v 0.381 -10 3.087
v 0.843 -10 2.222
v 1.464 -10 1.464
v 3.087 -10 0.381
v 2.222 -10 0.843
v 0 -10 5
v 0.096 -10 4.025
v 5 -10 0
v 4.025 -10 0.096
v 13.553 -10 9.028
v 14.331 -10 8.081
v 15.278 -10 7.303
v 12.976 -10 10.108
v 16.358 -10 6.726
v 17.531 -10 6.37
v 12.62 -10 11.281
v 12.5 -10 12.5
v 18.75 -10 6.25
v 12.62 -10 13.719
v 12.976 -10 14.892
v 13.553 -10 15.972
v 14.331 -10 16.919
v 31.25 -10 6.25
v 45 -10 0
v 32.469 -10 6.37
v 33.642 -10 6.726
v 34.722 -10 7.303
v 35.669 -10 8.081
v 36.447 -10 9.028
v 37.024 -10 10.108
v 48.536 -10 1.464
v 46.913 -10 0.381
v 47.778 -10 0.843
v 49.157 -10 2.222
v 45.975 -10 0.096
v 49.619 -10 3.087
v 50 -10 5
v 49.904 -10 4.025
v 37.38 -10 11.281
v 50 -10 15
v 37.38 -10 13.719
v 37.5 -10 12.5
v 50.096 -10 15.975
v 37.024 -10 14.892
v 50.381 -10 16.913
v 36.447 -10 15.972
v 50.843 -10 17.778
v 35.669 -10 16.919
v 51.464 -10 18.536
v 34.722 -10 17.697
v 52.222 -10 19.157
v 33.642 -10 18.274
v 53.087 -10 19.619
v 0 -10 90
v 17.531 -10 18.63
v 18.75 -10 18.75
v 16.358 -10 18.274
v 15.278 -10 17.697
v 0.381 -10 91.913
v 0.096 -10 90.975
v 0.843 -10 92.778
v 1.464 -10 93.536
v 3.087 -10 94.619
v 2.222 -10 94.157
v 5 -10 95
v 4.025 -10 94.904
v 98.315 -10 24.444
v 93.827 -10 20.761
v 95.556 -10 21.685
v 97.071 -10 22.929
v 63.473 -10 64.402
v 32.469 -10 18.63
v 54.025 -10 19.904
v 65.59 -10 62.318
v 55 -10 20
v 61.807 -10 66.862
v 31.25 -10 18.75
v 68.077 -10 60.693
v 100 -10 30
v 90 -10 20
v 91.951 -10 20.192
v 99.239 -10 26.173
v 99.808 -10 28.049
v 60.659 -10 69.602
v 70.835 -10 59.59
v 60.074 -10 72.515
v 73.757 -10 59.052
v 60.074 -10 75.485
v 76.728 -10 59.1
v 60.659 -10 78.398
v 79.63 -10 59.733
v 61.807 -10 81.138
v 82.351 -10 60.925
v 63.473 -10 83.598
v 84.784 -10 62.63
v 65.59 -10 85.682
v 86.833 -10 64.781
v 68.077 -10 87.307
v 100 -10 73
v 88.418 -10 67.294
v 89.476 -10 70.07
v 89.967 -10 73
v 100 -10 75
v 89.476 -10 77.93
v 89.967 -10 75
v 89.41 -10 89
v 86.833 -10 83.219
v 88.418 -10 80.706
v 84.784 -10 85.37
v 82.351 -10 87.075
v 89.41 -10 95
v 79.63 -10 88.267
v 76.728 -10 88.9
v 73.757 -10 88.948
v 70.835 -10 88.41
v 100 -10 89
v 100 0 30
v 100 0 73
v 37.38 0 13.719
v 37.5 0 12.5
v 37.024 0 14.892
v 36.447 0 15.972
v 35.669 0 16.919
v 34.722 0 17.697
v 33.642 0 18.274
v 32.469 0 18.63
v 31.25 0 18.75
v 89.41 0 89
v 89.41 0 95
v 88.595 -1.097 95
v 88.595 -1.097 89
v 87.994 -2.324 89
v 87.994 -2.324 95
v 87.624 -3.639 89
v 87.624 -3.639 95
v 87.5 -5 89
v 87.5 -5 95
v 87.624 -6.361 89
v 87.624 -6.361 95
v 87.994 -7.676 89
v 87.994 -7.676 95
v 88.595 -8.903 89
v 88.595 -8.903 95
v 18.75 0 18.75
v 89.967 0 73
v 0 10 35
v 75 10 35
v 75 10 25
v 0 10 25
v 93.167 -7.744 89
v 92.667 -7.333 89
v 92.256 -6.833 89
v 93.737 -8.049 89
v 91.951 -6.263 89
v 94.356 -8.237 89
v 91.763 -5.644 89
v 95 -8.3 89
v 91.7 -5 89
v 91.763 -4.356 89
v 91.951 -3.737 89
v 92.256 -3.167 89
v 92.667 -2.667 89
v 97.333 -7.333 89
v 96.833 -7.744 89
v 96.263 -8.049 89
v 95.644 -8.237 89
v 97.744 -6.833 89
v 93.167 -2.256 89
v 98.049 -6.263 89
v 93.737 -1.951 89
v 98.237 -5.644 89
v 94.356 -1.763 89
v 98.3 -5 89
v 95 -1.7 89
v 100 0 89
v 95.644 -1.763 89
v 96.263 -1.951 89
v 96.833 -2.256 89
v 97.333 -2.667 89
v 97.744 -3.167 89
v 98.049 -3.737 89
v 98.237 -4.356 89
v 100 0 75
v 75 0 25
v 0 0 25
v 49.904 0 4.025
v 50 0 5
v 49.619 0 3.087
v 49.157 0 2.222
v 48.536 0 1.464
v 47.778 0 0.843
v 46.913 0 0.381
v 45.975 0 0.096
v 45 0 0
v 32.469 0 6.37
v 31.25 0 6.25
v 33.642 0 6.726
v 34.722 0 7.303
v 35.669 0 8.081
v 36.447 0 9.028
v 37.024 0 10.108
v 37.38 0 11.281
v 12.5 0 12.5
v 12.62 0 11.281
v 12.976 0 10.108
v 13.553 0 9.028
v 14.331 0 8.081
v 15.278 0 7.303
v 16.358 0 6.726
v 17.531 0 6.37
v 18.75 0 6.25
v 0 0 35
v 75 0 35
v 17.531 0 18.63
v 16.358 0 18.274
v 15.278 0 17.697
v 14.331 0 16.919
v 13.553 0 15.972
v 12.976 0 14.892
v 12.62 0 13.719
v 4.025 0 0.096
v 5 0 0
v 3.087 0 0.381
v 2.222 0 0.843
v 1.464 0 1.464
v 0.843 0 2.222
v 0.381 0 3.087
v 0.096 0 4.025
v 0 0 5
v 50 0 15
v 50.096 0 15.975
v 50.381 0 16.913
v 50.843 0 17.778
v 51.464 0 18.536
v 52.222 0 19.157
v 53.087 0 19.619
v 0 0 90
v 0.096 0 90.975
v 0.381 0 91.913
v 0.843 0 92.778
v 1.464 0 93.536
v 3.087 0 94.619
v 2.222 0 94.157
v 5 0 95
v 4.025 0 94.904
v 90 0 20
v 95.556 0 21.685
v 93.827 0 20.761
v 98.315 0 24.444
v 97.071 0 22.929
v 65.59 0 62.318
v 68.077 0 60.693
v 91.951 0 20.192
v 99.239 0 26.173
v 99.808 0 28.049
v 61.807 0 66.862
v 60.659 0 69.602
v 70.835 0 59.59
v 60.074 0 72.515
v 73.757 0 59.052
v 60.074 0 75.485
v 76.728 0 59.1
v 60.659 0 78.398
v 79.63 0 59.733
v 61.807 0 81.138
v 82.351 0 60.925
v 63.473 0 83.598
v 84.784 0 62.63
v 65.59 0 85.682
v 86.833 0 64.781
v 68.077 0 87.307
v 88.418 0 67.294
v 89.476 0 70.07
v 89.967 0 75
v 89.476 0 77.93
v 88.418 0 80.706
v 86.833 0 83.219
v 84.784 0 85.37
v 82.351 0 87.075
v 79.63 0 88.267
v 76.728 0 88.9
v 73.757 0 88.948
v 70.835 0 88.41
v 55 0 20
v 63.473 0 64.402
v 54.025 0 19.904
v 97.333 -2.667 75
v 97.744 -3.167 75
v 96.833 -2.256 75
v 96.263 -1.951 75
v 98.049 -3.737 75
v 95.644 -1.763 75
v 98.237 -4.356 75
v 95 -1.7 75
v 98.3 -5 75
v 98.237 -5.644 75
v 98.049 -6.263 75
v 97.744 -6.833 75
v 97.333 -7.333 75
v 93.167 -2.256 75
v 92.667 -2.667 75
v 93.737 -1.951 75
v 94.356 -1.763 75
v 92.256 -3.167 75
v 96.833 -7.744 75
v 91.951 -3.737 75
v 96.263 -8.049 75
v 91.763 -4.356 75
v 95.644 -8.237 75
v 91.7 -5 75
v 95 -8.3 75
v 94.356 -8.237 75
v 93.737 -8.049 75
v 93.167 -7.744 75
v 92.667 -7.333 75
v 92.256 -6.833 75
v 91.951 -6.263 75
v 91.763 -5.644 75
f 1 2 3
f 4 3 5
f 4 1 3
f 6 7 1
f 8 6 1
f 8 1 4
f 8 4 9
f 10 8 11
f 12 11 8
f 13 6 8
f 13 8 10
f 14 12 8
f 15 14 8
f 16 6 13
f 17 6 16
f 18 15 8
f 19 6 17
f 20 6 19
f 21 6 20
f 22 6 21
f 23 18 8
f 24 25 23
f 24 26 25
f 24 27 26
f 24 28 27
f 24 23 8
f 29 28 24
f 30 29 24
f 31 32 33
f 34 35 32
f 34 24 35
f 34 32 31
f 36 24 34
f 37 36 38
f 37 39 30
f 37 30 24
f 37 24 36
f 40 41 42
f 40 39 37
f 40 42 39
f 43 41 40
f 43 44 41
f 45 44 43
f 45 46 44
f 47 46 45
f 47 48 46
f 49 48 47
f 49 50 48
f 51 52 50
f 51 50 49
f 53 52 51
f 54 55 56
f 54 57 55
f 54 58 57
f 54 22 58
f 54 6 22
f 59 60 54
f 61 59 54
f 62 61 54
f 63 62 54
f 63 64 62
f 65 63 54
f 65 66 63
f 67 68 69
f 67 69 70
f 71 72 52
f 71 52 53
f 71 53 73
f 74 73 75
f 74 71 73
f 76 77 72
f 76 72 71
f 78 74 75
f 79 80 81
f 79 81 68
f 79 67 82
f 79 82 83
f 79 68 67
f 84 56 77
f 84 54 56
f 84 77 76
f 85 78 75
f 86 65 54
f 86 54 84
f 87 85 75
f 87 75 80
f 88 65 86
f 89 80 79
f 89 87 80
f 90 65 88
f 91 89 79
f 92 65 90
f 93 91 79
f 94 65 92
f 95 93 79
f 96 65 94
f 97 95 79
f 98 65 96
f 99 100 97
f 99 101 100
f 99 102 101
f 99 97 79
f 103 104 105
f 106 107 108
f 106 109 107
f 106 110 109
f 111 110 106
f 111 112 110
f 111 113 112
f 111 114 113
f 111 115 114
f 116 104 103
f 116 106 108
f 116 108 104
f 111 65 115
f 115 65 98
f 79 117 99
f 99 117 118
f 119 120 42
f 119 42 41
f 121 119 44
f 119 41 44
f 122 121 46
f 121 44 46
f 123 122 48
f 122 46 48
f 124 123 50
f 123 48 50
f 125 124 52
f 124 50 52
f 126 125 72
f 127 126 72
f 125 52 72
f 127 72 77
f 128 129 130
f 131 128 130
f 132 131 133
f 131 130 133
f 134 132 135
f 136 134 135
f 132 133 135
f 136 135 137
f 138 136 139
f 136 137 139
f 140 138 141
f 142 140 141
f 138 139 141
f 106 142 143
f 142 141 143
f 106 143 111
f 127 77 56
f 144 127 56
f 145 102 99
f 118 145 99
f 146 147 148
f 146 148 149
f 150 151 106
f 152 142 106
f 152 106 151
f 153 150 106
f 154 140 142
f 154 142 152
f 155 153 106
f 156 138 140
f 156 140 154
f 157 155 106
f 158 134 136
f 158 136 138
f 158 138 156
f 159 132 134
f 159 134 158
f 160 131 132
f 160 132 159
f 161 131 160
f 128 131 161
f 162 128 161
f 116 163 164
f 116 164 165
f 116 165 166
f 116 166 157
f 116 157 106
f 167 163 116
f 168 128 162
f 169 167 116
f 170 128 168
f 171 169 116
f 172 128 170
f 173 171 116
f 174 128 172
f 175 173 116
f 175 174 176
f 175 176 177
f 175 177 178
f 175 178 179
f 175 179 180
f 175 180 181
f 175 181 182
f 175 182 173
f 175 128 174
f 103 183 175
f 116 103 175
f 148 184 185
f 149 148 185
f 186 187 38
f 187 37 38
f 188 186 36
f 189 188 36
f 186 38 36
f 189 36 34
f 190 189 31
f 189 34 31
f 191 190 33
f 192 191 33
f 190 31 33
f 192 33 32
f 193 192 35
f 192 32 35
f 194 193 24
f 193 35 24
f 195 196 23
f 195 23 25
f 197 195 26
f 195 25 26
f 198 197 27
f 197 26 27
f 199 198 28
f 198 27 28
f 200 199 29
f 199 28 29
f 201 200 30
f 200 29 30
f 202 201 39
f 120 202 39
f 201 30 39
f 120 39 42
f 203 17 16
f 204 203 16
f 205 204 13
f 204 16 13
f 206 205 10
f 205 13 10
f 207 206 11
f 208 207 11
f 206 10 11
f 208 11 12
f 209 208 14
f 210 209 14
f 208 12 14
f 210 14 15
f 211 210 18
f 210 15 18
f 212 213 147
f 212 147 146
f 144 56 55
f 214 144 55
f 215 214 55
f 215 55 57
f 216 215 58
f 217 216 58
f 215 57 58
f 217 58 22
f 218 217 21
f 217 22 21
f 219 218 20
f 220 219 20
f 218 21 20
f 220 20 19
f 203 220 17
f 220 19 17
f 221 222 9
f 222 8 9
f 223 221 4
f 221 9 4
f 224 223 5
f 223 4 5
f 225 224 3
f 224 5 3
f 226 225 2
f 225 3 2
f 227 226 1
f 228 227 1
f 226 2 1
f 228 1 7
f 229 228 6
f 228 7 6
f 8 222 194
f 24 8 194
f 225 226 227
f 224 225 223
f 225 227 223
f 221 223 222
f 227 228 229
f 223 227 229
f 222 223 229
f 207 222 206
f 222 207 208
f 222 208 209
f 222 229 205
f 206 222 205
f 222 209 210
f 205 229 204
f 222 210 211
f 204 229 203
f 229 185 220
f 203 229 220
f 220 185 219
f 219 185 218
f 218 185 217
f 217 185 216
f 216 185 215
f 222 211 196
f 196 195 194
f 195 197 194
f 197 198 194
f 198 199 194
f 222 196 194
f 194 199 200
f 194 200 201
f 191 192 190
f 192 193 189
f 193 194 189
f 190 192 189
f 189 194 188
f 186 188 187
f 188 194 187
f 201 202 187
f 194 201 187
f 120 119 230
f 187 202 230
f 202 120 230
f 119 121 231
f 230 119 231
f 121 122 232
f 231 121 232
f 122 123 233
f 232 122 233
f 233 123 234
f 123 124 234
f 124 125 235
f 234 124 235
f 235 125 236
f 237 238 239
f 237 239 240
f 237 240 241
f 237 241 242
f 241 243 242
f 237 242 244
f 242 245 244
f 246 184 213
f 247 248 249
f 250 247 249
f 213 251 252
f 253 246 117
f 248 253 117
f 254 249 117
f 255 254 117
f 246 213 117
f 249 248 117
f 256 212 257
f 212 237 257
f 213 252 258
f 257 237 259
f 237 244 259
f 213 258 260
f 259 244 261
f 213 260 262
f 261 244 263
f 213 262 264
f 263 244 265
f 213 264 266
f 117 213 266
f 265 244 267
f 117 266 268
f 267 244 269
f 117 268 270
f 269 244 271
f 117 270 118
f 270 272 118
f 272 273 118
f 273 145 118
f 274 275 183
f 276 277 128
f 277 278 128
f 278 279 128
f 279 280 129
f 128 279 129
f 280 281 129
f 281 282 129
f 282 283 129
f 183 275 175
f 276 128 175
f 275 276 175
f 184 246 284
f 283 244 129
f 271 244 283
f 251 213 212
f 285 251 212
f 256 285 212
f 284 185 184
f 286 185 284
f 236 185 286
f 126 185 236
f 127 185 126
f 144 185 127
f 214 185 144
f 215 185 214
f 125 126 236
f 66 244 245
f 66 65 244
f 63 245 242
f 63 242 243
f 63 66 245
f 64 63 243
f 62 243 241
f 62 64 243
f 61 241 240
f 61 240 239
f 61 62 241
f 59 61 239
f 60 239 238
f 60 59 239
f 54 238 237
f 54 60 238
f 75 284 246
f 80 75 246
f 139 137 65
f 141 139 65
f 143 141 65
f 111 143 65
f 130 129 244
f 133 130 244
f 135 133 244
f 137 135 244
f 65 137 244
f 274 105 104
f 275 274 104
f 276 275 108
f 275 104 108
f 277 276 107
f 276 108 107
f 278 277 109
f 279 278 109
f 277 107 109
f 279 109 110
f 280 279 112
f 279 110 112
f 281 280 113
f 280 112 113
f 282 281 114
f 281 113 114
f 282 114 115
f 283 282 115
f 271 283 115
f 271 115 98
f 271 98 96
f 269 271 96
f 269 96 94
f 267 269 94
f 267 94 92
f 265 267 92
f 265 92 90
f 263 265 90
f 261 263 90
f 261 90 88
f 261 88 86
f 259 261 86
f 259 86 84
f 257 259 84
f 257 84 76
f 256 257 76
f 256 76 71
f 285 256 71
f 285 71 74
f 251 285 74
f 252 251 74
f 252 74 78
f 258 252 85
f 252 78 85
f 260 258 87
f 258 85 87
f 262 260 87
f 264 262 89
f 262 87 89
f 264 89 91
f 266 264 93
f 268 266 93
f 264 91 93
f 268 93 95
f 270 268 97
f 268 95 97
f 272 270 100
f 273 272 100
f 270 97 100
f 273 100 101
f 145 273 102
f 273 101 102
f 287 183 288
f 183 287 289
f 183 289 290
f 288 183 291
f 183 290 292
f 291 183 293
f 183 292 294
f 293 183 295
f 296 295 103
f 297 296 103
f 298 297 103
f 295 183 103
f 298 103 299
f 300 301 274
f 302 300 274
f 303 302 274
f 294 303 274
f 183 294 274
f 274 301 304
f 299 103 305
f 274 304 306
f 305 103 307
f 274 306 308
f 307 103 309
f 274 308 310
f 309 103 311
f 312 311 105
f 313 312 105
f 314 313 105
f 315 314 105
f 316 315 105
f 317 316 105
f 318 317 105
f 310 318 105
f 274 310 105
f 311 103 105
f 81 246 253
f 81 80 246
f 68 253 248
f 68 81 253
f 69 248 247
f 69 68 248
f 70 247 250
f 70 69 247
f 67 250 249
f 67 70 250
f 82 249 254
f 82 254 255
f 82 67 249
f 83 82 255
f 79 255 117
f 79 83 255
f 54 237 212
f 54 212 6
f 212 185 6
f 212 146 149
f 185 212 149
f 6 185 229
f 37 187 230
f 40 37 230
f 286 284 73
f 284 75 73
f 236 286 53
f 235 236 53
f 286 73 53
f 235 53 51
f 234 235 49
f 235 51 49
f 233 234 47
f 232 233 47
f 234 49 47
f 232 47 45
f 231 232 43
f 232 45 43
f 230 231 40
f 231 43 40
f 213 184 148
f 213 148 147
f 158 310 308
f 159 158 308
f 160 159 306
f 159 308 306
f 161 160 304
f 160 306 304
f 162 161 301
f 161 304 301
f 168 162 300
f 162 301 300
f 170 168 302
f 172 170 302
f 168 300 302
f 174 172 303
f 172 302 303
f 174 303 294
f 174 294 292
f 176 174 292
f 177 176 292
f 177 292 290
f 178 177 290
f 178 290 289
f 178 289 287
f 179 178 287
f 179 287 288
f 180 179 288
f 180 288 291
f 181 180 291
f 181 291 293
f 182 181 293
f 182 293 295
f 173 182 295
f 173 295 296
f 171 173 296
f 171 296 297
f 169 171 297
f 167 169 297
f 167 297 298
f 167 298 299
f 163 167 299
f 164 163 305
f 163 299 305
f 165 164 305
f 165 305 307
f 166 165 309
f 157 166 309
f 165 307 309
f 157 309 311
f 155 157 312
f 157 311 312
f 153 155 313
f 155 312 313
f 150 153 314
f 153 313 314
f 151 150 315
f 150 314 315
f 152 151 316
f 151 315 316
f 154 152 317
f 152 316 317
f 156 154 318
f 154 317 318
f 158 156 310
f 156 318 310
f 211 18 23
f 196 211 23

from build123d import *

# Parameters (mm, degrees)
F1_DEPTH        = 10
F2_R            = 10
F4_DEPTH        = 10.001
F5_R            = 5
F6_W            = 75
F6_H            = 10
F7_DEPTH        = 10
F9_DEPTH        = 20.001
F11_D           = 6.6
F11_DEPTH       = 20
F11_CBORE_D     = 15
F11_CBORE_DEPTH = 6


with BuildPart() as f1:
    # F0 (on Front) → F1 (new body)
    with BuildSketch(Plane.XZ):
        Polygon((0, 95), (0, 0), (50, 0), (50, 20), (100, 20), (100, 95), align=None)
    extrude(amount=F1_DEPTH)

    # F2
    f2_edges = [f1.edges().sort_by_distance(p)[0] for p in [
        (100, -5, 20),
    ]]
    fillet(f2_edges, radius=F2_R)

    # F3 (on face) → F4 (cut, through all)
    with BuildSketch(Plane.XZ.offset(10)):
        with BuildLine():
            ThreePointArc((12.5, 12.5), (14.330583, 8.080583), (18.75, 6.25))
            Line((18.75, 6.25), (31.25, 6.25))
            ThreePointArc((31.25, 6.25), (35.669417, 8.080583), (37.5, 12.5))
            ThreePointArc((37.5, 12.5), (35.669417, 16.919417), (31.25, 18.75))
            Line((31.25, 18.75), (18.75, 18.75))
            ThreePointArc((18.75, 18.75), (14.330583, 16.919417), (12.5, 12.5))
        make_face()
    extrude(amount=-F4_DEPTH, mode=Mode.SUBTRACT)

    # F5
    f5_edges = [f1.edges().sort_by_distance(p)[0] for p in [
        (50, -5, 20),
        (50, -5, 0),
        (0, -5, 0),
        (0, -5, 95),
    ]]
    fillet(f5_edges, radius=F5_R)

    # F6 (on face) → F7 (join)
    with BuildSketch(Plane(origin=(0, 0, 0), x_dir=(-1, 0, 0), z_dir=(0, 1, 0))):
        with Locations((-37.5, 30)):
            Rectangle(F6_W, F6_H)
    extrude(amount=F7_DEPTH)

    # F8 (on face) → F9 (cut, through all)
    with BuildSketch(Plane.XZ.offset(10)):
        with BuildLine():
            Line((100, 75), (89.96663, 75))
            ThreePointArc((89.96663, 75), (60, 74), (89.96663, 73))
            Line((89.96663, 73), (100, 73))
            Line((100, 73), (100, 75))
        make_face()
    extrude(amount=-F9_DEPTH, mode=Mode.SUBTRACT)

    # F11
    with Locations(Plane.XY.offset(95)):
        with Locations((95, -5)):
            CounterBoreHole(F11_D / 2, F11_CBORE_D / 2, F11_CBORE_DEPTH, depth=F11_DEPTH)


solid = f1.part
